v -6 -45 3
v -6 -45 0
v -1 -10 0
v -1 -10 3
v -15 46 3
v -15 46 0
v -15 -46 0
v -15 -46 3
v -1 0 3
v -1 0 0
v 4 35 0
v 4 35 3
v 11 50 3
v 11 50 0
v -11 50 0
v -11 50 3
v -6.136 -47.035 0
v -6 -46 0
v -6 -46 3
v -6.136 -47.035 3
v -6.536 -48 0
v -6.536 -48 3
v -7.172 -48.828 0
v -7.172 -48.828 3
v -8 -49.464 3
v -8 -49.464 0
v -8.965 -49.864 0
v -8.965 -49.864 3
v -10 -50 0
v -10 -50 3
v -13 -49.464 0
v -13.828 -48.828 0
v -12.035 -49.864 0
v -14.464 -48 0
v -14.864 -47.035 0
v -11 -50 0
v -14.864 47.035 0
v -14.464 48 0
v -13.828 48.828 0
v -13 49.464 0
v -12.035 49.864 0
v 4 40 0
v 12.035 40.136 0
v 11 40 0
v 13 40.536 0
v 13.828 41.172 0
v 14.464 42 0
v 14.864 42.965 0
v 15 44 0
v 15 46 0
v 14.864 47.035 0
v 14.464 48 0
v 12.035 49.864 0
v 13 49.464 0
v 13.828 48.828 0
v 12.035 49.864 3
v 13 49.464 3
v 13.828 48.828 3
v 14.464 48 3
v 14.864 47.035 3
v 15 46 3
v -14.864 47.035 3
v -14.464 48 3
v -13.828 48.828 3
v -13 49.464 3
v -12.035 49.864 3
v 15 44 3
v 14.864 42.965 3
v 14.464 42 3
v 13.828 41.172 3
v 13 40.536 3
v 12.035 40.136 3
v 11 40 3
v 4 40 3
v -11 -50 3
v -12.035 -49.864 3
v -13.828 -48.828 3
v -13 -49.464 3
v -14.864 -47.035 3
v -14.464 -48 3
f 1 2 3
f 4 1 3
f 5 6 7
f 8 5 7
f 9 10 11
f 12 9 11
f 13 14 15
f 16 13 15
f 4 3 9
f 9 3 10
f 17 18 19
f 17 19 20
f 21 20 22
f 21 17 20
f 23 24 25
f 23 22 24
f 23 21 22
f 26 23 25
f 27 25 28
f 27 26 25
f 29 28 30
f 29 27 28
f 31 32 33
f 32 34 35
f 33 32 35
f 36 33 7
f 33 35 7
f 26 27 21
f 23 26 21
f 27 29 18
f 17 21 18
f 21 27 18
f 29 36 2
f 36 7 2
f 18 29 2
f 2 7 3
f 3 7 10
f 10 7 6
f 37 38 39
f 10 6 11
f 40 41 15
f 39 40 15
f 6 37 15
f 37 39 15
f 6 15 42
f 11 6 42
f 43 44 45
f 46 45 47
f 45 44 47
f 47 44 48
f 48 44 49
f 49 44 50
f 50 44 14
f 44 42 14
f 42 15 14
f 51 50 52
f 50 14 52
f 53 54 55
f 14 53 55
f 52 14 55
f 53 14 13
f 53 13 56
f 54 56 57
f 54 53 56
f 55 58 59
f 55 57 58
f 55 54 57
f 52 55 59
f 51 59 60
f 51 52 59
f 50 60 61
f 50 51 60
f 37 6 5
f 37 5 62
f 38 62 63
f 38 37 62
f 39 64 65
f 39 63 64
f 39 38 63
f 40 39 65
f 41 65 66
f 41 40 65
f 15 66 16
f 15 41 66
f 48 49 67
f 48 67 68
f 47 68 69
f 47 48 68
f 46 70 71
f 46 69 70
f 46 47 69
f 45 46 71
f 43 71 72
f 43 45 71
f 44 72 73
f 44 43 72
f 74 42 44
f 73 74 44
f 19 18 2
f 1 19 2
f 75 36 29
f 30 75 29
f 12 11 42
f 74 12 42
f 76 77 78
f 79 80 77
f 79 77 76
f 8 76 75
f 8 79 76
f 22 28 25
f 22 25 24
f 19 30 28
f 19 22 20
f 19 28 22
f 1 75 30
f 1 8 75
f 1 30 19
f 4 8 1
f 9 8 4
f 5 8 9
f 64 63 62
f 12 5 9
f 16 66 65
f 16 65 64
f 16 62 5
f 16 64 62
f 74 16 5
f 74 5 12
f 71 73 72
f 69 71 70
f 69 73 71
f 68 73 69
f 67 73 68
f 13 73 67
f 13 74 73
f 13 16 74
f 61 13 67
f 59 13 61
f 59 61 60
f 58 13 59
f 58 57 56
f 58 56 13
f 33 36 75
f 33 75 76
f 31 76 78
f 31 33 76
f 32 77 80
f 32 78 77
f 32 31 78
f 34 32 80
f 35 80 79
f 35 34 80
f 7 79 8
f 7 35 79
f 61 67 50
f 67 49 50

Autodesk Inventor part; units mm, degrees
ref_plane "YZ Plane" through (0, 0, 0) normal (1, 0, 0) x (0, 1, 0)
ref_plane "XZ Plane" through (0, 0, 0) normal (0, 1, 0) x (-1, 0, 0)
ref_plane "XY Plane" through (0, 0, 0) normal (0, 0, 1) x (1, 0, 0)
sketch "Sketch1" plane through (0, 0, 0) normal (0, 0, 1) x (1, 0, 0)
  line L0 (11, 50) -> (-11, 50)
  line L1 (-15, 46) -> (-15, -46)
  line L2 (-11, -50) -> (-10, -50)
  line L3 (-6, -46) -> (-6, -45)
  line L4 (-6, -45) -> (-1, -10)
  line L5 (-1, -10) -> (-1, 0)
  line L6 (-1, 0) -> (4, 35)
  line L7 (4, 35) -> (4, 40)
  arc A0 (-10, -50) -> (-6, -46) centre (-10, -46) ccw
  arc A1 (-15, -46) -> (-11, -50) centre (-11, -46) ccw
  arc A2 (-11, 50) -> (-15, 46) centre (-11, 46) ccw
  line L8 (4, 40) -> (11, 40)
  line L9 (15, 44) -> (15, 46)
  arc A3 (15, 46) -> (11, 50) centre (11, 46) ccw
  arc A4 (11, 40) -> (15, 44) centre (11, 44) ccw
  point P0 (0, 0)
  point P1 (-15, 50)
  point P2 (-15, -50)
  point P3 (-6, -50)
  point P4 (-15, 0)
  point P5 (0, 50)
  dimension "d0" = 19
  dimension "d1" = 14
  dimension "d2" = 100
  dimension "d3" = 9
  dimension "d4" = 4
  dimension "d5" = 4
  dimension "d6" = 30
  dimension "d7" = 45
  dimension "d9" = 10
  dimension "d10" = 5
extrude "Extrusion1" add sketch "Sketch1" along normal blind 3
properties part number "Pin" material "Polycarbonate, Clear"
